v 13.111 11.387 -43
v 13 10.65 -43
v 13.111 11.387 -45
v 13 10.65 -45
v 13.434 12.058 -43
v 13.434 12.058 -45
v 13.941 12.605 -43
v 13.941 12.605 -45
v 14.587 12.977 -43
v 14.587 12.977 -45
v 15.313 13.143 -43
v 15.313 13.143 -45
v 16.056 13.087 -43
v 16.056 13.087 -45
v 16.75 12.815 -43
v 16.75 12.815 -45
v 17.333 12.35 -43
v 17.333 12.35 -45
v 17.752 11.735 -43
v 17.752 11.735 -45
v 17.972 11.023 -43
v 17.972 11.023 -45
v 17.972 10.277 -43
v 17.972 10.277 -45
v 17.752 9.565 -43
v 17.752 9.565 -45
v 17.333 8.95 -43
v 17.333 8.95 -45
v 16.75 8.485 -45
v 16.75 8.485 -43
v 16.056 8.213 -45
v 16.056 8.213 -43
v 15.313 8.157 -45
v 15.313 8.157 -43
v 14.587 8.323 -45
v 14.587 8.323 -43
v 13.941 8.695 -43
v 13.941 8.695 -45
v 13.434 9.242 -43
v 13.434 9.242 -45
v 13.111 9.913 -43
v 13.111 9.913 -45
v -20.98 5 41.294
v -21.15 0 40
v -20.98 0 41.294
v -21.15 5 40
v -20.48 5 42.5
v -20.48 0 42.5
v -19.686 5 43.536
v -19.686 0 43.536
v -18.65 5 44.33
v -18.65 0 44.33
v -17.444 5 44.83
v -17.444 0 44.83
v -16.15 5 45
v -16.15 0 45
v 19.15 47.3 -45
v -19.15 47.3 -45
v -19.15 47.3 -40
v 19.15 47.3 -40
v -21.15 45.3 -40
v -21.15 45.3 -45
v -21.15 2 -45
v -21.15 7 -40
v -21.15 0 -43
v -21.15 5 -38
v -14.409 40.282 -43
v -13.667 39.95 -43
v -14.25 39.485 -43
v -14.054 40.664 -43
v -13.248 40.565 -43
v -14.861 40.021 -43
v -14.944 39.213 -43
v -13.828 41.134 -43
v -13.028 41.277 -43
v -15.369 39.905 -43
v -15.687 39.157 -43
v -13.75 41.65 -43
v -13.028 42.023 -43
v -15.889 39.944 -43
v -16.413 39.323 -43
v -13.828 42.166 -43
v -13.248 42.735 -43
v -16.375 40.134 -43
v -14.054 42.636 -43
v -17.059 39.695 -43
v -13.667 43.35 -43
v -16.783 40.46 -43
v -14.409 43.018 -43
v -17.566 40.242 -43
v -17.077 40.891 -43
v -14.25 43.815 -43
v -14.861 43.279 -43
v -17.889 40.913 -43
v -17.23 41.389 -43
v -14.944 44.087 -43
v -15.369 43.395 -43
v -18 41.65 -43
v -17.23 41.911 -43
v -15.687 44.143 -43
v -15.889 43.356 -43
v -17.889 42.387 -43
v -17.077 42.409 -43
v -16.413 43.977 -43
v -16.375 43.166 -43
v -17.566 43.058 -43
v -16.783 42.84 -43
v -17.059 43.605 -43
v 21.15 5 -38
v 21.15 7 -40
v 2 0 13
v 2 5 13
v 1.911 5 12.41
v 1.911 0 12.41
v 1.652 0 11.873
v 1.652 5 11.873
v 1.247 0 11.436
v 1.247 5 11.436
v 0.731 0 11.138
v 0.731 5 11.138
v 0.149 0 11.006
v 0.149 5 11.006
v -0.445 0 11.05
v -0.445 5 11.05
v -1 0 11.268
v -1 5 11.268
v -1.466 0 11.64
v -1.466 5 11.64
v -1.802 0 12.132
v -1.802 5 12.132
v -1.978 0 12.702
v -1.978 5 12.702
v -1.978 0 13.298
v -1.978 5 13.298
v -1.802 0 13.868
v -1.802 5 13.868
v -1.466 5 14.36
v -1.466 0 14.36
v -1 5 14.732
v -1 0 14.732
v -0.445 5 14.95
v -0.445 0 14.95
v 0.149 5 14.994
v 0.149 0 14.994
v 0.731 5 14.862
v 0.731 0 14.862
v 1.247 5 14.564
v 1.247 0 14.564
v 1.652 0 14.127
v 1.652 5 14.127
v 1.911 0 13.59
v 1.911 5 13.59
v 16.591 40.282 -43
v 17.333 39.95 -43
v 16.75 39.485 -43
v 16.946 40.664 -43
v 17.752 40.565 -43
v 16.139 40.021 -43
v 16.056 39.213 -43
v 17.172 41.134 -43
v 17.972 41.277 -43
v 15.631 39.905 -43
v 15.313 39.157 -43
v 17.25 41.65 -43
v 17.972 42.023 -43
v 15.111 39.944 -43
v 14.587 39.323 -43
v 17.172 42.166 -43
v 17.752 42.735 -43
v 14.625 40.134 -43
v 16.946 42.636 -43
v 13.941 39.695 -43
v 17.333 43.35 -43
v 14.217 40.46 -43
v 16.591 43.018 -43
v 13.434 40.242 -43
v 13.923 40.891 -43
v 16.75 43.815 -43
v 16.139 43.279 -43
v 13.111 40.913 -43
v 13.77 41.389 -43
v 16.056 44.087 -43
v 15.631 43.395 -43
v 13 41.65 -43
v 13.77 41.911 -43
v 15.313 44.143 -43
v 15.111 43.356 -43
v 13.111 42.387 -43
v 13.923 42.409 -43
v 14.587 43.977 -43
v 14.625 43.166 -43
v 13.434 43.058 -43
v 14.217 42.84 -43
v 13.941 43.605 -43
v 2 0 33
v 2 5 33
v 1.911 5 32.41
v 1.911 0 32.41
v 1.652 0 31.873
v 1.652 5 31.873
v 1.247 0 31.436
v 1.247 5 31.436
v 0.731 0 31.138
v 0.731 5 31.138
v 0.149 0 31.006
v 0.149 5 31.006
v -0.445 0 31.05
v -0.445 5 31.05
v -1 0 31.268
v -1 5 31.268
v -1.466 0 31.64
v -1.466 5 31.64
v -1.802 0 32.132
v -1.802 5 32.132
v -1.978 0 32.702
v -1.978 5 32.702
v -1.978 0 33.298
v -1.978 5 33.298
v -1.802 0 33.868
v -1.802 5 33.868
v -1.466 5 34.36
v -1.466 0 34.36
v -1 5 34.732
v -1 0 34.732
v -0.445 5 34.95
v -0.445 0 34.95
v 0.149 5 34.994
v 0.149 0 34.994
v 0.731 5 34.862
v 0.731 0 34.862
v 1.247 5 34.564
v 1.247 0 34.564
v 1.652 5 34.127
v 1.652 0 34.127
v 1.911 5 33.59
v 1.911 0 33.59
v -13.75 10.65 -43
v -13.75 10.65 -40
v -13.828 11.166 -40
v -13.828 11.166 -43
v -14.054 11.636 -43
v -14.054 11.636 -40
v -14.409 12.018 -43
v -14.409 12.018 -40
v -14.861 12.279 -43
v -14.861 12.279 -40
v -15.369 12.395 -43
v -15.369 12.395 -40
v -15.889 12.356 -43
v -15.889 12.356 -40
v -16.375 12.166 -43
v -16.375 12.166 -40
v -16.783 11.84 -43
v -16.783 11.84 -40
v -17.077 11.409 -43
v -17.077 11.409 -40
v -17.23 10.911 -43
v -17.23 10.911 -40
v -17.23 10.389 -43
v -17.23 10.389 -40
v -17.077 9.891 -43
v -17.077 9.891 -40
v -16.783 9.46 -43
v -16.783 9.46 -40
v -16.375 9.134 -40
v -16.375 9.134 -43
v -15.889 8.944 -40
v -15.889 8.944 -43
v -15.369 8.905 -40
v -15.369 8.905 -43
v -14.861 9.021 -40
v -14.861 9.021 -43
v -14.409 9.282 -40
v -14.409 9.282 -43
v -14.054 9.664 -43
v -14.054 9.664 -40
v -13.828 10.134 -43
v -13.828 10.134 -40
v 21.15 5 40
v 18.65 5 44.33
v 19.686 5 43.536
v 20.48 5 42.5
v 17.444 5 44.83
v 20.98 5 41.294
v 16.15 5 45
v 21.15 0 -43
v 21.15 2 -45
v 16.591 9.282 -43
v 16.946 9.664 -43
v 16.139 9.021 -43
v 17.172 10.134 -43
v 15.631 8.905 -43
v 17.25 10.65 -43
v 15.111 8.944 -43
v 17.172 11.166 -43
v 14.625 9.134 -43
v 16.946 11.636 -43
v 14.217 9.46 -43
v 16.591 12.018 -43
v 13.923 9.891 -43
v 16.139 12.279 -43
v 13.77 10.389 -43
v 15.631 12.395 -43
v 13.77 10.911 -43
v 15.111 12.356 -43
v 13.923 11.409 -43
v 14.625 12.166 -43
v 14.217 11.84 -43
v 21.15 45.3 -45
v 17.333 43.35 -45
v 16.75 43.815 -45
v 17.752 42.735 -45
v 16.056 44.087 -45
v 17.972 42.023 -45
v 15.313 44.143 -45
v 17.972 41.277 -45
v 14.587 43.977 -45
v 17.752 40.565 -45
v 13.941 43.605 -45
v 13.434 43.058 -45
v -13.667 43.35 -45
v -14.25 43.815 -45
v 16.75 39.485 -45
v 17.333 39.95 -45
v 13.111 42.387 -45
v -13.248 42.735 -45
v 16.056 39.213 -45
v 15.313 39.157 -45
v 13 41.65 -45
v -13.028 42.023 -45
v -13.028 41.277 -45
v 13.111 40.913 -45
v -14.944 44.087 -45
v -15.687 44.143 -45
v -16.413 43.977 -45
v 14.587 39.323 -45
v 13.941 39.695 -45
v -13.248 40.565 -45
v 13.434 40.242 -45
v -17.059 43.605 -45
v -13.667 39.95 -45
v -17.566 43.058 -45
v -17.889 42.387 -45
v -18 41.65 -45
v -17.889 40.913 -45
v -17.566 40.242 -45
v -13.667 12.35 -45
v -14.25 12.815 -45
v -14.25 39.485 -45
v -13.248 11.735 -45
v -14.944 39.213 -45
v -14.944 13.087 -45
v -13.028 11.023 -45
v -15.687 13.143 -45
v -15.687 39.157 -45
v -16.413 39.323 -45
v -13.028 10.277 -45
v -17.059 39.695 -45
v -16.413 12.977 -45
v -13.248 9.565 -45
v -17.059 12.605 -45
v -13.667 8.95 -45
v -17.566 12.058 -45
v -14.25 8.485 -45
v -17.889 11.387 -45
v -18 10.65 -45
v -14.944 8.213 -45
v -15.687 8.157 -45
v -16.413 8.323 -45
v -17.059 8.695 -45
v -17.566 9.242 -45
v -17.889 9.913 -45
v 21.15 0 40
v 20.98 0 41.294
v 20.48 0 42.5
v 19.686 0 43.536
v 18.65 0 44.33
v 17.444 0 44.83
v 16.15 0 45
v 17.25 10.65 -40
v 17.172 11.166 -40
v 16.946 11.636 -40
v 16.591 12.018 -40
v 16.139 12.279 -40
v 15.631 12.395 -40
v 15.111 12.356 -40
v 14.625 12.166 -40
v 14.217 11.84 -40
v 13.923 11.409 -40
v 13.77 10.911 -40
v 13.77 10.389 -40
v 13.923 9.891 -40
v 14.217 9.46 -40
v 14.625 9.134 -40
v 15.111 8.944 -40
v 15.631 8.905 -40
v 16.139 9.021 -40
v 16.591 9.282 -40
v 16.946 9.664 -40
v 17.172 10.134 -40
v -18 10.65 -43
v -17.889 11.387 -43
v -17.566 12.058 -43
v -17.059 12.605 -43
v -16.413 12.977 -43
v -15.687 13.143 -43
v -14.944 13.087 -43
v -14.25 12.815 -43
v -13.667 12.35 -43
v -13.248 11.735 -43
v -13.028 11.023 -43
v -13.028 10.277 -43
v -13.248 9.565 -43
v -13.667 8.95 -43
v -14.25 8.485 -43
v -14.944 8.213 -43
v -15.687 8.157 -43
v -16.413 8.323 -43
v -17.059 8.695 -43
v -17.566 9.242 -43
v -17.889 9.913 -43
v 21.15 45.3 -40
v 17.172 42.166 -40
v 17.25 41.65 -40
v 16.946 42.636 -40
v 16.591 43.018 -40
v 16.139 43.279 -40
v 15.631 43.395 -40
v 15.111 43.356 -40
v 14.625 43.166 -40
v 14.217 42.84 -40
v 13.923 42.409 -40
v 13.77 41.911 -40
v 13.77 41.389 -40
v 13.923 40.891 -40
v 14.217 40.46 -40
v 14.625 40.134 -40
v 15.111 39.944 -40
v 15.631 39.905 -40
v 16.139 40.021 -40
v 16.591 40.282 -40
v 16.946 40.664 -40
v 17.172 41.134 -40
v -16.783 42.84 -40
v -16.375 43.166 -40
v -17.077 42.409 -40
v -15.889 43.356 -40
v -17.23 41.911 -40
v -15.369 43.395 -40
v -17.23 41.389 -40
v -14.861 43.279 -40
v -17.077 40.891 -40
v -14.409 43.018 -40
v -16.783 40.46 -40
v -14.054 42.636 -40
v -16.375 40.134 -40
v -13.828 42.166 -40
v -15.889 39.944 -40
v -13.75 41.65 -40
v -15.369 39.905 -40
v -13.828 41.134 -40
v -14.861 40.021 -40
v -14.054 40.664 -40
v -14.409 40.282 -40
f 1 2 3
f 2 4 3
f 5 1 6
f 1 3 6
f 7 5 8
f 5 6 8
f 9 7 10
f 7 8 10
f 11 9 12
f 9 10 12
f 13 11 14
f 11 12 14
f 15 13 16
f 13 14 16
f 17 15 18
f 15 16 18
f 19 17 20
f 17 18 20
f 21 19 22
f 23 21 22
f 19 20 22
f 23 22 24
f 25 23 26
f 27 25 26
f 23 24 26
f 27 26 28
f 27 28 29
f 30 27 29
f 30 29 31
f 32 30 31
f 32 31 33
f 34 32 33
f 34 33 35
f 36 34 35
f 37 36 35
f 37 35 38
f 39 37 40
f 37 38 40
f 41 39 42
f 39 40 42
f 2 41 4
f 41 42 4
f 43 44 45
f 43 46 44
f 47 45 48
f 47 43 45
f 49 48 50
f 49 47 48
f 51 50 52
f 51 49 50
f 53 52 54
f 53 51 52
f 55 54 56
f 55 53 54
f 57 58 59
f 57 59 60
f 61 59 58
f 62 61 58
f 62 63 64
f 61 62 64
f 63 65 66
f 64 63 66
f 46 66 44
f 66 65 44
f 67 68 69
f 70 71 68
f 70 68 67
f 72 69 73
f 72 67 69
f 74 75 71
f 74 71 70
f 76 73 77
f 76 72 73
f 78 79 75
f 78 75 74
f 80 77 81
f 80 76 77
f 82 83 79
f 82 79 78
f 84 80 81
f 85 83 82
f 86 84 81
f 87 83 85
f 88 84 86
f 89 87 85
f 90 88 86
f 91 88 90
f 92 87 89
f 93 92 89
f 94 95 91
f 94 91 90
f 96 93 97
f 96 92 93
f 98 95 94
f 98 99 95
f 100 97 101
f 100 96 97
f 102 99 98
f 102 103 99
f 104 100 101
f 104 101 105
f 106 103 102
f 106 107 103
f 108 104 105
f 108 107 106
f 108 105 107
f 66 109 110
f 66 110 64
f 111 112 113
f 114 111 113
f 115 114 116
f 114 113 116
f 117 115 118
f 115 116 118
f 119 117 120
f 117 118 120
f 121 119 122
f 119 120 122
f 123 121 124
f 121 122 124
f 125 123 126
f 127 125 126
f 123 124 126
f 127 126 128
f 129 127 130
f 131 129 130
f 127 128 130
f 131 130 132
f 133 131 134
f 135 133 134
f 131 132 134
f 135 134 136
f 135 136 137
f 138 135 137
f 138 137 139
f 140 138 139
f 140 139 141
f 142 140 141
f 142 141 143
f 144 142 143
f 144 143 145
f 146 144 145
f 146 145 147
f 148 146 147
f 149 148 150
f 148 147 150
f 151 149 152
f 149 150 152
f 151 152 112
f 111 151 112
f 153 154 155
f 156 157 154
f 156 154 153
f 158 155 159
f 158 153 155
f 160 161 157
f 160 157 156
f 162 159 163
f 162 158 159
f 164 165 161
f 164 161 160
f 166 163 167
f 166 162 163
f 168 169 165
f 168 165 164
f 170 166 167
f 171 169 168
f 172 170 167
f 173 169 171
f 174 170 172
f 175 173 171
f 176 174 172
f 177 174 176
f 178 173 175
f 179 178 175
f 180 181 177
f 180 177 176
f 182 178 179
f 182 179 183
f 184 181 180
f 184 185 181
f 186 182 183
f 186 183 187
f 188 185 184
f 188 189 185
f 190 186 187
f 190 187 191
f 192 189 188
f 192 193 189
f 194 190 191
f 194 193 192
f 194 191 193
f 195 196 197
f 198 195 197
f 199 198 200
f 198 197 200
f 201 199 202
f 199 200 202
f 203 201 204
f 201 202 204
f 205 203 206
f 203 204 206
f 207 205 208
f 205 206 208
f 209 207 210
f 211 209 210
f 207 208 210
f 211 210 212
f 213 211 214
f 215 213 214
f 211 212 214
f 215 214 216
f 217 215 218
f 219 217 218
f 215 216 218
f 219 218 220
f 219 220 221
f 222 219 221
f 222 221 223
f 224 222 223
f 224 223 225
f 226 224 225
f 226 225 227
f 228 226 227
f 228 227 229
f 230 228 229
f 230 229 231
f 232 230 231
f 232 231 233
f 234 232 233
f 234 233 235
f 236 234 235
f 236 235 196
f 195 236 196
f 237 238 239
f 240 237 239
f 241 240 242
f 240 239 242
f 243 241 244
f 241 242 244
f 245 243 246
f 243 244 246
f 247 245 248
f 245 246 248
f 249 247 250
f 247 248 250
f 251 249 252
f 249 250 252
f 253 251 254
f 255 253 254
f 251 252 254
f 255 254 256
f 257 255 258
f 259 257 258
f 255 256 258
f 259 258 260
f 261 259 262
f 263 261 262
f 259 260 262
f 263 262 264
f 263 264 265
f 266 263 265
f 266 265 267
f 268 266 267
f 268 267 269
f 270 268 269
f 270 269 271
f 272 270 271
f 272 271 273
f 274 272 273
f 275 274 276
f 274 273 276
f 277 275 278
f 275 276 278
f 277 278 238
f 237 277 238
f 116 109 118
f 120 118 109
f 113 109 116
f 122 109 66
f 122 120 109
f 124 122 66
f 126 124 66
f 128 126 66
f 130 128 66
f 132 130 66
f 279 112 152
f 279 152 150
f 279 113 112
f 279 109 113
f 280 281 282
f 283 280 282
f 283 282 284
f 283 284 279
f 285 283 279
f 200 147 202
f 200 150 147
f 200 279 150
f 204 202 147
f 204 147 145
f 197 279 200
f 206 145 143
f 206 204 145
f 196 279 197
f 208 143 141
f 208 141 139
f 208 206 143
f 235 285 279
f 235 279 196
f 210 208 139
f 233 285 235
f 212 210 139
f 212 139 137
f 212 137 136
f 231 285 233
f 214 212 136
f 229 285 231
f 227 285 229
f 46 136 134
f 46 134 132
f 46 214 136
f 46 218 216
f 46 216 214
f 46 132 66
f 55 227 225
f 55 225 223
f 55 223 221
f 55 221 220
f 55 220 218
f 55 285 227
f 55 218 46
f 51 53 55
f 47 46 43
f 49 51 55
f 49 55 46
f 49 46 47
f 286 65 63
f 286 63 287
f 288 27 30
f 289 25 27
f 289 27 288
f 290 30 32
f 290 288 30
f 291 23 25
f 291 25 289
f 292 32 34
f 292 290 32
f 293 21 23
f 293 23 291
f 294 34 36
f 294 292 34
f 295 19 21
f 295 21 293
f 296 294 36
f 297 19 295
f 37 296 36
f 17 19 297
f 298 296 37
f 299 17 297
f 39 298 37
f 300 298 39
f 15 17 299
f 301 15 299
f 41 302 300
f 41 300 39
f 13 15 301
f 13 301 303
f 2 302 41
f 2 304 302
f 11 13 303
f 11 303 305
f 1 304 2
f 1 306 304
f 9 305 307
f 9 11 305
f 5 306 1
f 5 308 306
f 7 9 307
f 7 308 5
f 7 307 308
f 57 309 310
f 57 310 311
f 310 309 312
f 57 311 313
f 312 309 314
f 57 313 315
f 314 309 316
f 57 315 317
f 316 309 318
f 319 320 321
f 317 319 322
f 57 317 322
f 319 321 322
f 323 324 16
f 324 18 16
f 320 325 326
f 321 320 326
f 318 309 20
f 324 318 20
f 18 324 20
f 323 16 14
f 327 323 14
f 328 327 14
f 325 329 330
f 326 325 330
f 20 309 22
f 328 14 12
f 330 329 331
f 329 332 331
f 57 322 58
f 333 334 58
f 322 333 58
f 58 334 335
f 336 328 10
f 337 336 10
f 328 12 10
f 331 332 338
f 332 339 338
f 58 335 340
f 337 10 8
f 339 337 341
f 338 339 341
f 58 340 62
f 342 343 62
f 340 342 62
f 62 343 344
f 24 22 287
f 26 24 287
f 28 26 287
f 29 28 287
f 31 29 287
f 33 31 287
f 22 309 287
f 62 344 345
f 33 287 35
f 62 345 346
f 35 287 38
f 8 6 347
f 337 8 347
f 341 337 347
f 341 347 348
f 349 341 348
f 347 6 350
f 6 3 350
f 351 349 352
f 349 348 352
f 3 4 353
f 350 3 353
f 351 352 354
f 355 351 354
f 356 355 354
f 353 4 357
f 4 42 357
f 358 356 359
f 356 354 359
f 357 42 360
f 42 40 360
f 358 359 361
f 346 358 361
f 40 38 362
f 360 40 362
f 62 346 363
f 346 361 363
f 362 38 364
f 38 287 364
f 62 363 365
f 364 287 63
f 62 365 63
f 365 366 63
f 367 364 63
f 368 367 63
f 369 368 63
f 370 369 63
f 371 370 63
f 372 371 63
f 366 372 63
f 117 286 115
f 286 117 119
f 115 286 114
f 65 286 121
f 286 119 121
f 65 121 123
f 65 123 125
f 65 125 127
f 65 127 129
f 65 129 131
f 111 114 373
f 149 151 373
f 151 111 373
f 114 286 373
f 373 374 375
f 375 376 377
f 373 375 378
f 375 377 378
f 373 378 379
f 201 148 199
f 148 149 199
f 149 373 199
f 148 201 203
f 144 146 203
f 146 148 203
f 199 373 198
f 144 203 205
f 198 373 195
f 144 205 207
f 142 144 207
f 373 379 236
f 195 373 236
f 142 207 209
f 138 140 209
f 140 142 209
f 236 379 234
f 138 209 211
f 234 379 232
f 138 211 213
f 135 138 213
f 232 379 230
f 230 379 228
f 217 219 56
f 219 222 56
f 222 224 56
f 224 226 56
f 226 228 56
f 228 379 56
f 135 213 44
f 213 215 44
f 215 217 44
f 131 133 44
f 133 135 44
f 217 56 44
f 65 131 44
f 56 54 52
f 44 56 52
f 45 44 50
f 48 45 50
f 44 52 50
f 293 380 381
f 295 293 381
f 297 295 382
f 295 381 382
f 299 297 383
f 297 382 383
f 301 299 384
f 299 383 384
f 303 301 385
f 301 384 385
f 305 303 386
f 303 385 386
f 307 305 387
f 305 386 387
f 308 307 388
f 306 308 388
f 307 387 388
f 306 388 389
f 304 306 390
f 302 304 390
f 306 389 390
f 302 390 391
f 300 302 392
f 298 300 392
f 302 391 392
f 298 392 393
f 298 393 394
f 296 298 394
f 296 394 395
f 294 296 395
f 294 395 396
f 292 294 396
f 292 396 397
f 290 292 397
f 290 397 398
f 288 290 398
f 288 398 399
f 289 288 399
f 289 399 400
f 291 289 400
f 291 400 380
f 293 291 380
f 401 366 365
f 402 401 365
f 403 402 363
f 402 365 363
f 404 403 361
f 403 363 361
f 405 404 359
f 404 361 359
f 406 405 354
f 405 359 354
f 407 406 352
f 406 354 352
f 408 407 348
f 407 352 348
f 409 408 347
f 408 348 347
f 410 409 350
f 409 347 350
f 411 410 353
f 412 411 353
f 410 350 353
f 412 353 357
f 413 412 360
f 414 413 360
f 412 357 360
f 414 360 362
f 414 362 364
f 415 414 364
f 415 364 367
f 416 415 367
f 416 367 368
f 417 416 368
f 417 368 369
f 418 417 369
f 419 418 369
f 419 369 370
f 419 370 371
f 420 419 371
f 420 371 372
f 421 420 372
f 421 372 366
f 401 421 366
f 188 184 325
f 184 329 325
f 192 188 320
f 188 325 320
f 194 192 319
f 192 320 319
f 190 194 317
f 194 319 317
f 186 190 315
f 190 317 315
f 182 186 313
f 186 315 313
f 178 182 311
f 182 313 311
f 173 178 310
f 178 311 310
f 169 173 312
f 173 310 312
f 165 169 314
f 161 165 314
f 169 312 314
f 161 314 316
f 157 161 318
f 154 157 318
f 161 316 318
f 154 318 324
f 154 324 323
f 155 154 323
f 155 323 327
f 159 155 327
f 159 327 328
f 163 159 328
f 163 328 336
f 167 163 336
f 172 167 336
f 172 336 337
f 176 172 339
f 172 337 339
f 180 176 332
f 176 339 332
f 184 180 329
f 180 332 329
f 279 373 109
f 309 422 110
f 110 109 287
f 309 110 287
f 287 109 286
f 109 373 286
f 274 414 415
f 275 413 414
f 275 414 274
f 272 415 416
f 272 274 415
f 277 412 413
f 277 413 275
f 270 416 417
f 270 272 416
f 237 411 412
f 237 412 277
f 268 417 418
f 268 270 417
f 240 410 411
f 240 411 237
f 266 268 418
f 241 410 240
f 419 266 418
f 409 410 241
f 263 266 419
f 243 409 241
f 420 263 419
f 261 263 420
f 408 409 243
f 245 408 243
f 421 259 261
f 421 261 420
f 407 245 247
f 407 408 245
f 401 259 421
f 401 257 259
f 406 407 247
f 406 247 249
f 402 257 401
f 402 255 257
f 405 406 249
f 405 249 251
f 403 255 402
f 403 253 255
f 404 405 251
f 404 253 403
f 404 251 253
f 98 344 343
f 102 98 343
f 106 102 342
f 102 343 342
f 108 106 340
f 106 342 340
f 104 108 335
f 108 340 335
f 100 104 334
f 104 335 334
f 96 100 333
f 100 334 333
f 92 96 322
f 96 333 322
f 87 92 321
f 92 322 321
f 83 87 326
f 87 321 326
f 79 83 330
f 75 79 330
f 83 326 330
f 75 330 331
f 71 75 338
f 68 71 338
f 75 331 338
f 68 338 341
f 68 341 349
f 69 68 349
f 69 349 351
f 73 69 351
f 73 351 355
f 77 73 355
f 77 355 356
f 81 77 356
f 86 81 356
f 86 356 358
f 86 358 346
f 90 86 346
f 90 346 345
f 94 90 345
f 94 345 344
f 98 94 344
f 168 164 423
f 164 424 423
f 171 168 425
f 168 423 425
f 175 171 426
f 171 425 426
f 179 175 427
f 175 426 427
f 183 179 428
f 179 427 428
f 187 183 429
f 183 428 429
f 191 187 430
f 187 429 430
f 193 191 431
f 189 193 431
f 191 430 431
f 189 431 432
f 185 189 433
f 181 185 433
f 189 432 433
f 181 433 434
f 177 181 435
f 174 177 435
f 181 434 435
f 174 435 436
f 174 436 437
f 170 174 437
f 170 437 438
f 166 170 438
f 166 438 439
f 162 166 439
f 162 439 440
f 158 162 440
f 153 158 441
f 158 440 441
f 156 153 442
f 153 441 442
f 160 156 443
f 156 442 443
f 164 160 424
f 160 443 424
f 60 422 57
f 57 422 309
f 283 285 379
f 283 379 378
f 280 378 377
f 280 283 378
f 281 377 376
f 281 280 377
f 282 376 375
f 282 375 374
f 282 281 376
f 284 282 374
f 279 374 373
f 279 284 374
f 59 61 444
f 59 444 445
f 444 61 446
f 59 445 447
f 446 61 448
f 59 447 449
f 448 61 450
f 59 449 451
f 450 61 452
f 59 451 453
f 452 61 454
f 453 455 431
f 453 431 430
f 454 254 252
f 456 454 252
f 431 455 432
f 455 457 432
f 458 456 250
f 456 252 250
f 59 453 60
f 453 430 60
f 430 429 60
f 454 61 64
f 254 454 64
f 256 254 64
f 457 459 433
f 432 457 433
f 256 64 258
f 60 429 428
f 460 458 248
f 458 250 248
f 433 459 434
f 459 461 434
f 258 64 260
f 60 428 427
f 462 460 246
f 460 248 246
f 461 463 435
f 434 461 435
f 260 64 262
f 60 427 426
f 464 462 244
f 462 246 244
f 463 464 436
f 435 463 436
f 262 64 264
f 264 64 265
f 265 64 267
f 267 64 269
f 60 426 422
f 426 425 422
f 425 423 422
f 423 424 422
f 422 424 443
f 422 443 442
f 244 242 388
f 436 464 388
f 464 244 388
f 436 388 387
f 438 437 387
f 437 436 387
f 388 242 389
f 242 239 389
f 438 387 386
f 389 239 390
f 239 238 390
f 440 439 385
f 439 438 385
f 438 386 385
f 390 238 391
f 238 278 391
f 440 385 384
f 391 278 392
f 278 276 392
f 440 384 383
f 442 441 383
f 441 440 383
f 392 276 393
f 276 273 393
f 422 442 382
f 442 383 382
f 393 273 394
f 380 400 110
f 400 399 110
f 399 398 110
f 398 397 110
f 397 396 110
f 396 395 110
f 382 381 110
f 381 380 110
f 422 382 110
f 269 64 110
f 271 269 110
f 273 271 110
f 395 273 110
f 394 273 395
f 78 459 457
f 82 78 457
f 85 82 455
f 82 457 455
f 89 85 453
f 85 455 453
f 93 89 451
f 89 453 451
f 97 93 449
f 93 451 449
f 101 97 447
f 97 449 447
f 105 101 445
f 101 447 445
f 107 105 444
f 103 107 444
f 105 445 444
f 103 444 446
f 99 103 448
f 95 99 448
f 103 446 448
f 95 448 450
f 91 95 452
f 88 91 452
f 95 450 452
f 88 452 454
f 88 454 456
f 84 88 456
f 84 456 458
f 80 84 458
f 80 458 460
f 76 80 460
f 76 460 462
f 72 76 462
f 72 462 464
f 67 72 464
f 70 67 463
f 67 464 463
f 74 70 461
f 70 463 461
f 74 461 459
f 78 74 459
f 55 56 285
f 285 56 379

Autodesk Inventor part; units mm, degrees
ref_plane "YZ Plane" through (0, 0, 0) normal (1, 0, 0) x (0, 1, 0)
ref_plane "XZ Plane" through (0, 0, 0) normal (0, 1, 0) x (-1, 0, 0)
ref_plane "XY Plane" through (0, 0, 0) normal (0, 0, 1) x (1, 0, 0)
sketch "Sketch1" plane through (0, 0, 0) normal (0, 1, 0) x (-1, 0, 0)
  line L0 (21.15, 45) -> (-21.15, 45)
  line L1 (-21.15, 45) -> (-21.15, -45)
  line L2 (-21.15, -45) -> (21.15, -45)
  line L3 (21.15, -45) -> (21.15, 45)
  line L4 (21.15, 45) -> (-21.15, -45) construction
  line L5 (-21.15, 45) -> (21.15, -45) construction
  point P0 (0, 0)
  dimension "d0" = 42.3
  dimension "d1" = 90
extrude "Extrusion1" add sketch "Sketch1" along normal blind 5
sketch "Sketch2" plane through (0, 5, 0) normal (0, 1, 0) x (1, 0, 0)
  line L0 (0, 0) -> (0, 42.5)
  line L1 (21.15, -45) -> (21.15, 45) projected
  line L2 (-21.15, 40) -> (21.15, 40)
  line L3 (21.15, 40) -> (21.15, 45)
  line L4 (21.15, 45) -> (-21.15, 45)
  line L5 (-21.15, 45) -> (-21.15, 40)
  line L6 (-21.15, 40) -> (21.15, 45) construction
  line L7 (21.15, 40) -> (-21.15, 45) construction
  dimension "d4" = 42.5
  dimension "d5" = 42.3
  dimension "d6" = 5
extrude "Extrusion2" add sketch "Sketch2" along normal blind 42.3
sketch "Sketch3" plane through (-21.15, 5, -40) normal (0, 0, 1) x (1, 0, 0)
  line L0 (42.3, 0) -> (0, 0) projected
  line L1 (42.3, 0) -> (42.3, 42.3) projected
  line L2 (0, 42.3) -> (42.3, 42.3) projected
  line L3 (0, 0) -> (0, 42.3) projected
  line L4 (42.3, 42.3) -> (0, 0)
  line L5 (5.65, 36.65) -> (36.65, 36.65)
  line L6 (36.65, 36.65) -> (36.65, 5.65)
  line L7 (36.65, 5.65) -> (5.65, 5.65)
  line L8 (5.65, 5.65) -> (5.65, 36.65)
  line L9 (5.65, 36.65) -> (36.65, 5.65) construction
  line L10 (36.65, 36.65) -> (5.65, 5.65) construction
  circle A0 centre (5.65, 36.65) radius 1.75
  circle A1 centre (36.65, 36.65) radius 1.75
  circle A2 centre (5.65, 5.65) radius 1.75
  circle A3 centre (36.65, 5.65) radius 1.75
  point P0 (21.15, -5)
  point P1 (21.15, 21.15)
  dimension "d9" = 31
  dimension "d10" = 31
  dimension "d11" = 3.5
  dimension "d14" = 31
  dimension "d17" = 31
extrude "Extrusion3" cut sketch "Sketch3" against normal blind 42.3 contours A2 L8 L4 | L4 L7 A2 | A1 L6 L4 | L4 L5 A1 | L8 A2 L4 | L4 A2 L7 | L6 A1 L4 | L4 A1 L5 | A0 L5 L8 | L8 L5 A0 | A3 L6 L7 | L7 L6 A3
chamfer "Chamfer1" distance 2 angle 45 1 edges at (0, 5, -40)
chamfer "Chamfer2" distance 2 angle 45 3 edges at (21.15, 47.3, -42.5) (-21.15, 47.3, -42.5) (0, 0, -45)
sketch "Sketch4" plane through (0, 5, 0) normal (0, 1, 0) x (1, 0, 0)
  line L0 (-21.15, -45) -> (21.15, -45) projected
  line L1 (0, -45) -> (0, -33)
  line L2 (0, -33) -> (0, -13)
  circle A0 centre (0, -33) radius 2
  circle A1 centre (0, -13) radius 2
  point P0 (0, 0)
  dimension "d28" = 12
  dimension "d29" = 20
  dimension "d30" = 4
  dimension "d31" = 4
sketch "Sketch5" plane through (21.15, 2, -45) normal (0, 0, -1) x (-1, 0, 0)
  circle A0 centre (5.65, 39.65) radius 1.75 projected
  circle A1 centre (36.65, 39.65) radius 1.75 projected
  circle A2 centre (5.65, 8.65) radius 1.75 projected
  circle A3 centre (36.65, 8.65) radius 1.75 projected
  circle A4 centre (5.65, 39.65) radius 2.5
  circle A5 centre (36.65, 39.65) radius 2.5
  circle A6 centre (5.65, 8.65) radius 2.5
  circle A7 centre (36.65, 8.65) radius 2.5
  point P0 (21.15, -2)
  dimension "d32" = 5
  dimension "d33" = 5
  dimension "d34" = 5
  dimension "d35" = 5
extrude "Extrusion4" cut sketch "Sketch5" against normal blind 2 contours A0 | A1 | A2 | A3 | A4 | A5 | A6 | A7
extrude "Extrusion5" cut sketch "Sketch4" against normal blind 5
fillet "Fillet1" radius 5 2 edges at (21.15, 2.5, 45) (-21.15, 2.5, 45)
properties part number "ACOPLE PARA NEMA DE CAJA"
